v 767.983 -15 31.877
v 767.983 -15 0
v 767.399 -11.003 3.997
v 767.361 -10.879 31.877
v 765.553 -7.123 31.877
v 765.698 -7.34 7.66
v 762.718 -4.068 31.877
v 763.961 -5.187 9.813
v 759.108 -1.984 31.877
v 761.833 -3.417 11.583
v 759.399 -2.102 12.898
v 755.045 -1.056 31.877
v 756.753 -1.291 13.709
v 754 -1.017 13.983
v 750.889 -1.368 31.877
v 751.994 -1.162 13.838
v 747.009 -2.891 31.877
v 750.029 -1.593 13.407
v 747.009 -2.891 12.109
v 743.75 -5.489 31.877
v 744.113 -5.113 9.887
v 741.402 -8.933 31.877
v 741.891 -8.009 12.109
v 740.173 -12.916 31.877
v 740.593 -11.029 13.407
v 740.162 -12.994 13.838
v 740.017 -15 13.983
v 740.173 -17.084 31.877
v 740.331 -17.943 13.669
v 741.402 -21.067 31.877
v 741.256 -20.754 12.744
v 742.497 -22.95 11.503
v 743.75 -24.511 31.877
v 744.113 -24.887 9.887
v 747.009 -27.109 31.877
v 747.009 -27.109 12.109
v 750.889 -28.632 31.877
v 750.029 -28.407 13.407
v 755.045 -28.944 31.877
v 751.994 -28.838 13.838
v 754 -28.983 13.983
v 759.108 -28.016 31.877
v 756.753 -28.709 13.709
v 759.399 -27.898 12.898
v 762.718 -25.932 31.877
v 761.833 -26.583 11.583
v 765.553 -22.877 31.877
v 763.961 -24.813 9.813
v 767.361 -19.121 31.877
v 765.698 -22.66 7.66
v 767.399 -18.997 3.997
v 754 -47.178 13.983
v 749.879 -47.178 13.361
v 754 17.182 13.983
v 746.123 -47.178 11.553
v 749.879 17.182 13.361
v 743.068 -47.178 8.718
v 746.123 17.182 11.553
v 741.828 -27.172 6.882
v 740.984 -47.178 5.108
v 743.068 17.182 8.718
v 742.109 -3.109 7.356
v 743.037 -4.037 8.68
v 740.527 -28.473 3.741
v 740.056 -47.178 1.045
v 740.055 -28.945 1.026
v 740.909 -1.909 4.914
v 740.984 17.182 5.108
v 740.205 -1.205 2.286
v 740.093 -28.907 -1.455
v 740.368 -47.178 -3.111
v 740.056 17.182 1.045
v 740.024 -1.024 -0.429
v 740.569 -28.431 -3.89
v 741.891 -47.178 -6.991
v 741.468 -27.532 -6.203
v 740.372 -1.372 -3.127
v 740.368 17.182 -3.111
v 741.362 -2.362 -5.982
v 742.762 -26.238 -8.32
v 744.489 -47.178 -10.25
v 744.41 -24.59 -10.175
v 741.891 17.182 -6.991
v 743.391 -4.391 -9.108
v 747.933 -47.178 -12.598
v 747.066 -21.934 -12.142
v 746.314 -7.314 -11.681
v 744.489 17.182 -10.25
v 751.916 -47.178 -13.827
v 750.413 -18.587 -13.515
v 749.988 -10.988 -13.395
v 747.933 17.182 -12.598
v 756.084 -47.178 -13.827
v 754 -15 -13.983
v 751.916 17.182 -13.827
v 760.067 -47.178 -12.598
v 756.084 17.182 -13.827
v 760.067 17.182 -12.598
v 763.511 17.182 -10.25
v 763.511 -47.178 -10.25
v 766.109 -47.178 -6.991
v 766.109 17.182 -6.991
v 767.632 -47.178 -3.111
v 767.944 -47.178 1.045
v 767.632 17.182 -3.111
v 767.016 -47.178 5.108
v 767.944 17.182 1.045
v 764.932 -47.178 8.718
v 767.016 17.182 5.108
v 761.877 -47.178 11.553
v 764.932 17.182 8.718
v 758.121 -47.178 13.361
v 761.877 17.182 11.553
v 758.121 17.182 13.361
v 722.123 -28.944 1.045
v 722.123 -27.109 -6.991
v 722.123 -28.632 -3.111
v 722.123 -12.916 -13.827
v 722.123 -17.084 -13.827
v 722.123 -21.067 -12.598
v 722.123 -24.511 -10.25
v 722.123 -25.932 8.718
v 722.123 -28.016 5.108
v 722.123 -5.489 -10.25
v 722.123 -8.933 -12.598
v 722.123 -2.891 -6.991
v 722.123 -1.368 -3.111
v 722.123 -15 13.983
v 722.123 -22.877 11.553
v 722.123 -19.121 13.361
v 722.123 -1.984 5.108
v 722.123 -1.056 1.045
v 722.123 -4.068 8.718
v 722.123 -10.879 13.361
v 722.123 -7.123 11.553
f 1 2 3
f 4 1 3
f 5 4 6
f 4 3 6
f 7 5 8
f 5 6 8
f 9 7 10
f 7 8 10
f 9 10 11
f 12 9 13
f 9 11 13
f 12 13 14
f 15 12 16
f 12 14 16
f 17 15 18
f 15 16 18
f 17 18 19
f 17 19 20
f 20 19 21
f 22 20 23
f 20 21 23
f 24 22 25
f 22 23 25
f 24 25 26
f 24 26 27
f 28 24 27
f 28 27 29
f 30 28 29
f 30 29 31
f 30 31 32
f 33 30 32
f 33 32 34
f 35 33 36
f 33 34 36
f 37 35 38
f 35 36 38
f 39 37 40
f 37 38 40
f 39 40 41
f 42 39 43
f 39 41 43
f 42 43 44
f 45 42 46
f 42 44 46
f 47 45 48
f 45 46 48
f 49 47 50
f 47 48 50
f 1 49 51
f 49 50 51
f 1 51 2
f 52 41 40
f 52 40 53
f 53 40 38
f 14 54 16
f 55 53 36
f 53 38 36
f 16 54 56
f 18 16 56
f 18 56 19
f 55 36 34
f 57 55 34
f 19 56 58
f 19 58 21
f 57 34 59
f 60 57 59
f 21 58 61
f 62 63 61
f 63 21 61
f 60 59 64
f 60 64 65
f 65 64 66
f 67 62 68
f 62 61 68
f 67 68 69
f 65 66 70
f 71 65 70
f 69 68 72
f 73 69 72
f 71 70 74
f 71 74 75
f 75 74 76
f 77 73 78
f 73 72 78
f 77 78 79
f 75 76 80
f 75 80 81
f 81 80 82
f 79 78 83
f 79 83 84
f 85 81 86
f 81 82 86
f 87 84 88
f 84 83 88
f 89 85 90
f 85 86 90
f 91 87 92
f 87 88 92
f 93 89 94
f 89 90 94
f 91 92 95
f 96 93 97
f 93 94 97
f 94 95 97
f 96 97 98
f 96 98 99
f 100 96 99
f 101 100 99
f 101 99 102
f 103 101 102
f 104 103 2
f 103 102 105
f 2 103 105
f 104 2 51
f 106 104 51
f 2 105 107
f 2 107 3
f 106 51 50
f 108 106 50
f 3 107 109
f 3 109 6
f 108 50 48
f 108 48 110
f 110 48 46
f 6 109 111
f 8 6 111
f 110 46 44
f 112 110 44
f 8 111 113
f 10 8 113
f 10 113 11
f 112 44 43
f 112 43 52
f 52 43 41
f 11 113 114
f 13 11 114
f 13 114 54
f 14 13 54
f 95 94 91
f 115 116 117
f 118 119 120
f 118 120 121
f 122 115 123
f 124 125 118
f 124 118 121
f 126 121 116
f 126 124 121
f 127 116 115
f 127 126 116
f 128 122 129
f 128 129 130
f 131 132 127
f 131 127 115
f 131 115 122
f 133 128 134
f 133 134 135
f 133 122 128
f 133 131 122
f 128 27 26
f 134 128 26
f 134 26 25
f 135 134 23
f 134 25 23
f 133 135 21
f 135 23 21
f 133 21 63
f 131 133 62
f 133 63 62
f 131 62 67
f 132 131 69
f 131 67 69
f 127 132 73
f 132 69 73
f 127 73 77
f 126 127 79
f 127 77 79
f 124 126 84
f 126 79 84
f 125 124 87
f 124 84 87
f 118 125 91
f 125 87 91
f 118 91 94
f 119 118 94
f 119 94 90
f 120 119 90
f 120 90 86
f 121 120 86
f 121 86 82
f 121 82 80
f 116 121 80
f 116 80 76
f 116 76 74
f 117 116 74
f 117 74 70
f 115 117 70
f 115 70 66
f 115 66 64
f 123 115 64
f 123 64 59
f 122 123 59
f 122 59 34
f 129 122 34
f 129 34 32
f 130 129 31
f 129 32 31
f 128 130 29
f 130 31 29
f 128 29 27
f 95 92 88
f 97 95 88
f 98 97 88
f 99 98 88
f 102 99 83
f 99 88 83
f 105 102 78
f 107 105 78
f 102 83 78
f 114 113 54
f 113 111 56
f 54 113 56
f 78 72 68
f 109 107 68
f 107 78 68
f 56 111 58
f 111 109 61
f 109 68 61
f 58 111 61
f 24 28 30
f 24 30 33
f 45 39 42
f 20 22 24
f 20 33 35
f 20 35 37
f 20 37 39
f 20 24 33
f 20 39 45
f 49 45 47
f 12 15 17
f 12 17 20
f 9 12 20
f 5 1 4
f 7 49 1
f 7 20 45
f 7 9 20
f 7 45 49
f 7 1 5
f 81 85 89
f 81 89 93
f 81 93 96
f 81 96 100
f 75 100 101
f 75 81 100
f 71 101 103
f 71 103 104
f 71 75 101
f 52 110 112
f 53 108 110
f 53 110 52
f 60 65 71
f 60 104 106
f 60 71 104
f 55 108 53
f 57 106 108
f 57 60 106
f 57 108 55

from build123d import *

# Parameters (mm, degrees)
CYLINDER015_R             = 13.9827
CYLINDER015_DEPTH         = 31.877
CYLINDER014_R             = 13.9827
CYLINDER014_DEPTH         = 64.36
CYLINDER016_R             = 13.9827
CYLINDER016_DEPTH         = 31.877
FUSION007_PLACEMENT_ANGLE = 90


with BuildPart() as cylinder015:
    # Cylinder015 → Cylinder015 (new body)
    with BuildSketch(Plane(origin=(0, 0, 0), x_dir=(0, 0, -1), z_dir=(1, 0, 0))):
        Circle(CYLINDER015_R)
    extrude(amount=CYLINDER015_DEPTH)


with BuildPart() as cylinder014:
    # Cylinder014 → Cylinder014 (new body)
    with BuildSketch(Plane.XZ.offset(-32.1818)):
        Circle(CYLINDER014_R)
    extrude(amount=CYLINDER014_DEPTH)


with BuildPart() as f_4_way001:
    # Cylinder016 → Cylinder016 (new body)
    with BuildSketch(Plane.XY):
        Circle(CYLINDER016_R)
    extrude(amount=CYLINDER016_DEPTH)

    # Fusion006: union Cylinder014
    add(cylinder014.part)

    # Fusion007: union Cylinder015
    add(cylinder015.part)


with BuildPart() as f_4_way001_1:
    # Fusion007 placement: moved
    add(f_4_way001.part.moved(Location((754, -15, 0))).rotate(Axis((754, -15, 0), (0, -1, 0)), FUSION007_PLACEMENT_ANGLE))


solid = f_4_way001_1.part
